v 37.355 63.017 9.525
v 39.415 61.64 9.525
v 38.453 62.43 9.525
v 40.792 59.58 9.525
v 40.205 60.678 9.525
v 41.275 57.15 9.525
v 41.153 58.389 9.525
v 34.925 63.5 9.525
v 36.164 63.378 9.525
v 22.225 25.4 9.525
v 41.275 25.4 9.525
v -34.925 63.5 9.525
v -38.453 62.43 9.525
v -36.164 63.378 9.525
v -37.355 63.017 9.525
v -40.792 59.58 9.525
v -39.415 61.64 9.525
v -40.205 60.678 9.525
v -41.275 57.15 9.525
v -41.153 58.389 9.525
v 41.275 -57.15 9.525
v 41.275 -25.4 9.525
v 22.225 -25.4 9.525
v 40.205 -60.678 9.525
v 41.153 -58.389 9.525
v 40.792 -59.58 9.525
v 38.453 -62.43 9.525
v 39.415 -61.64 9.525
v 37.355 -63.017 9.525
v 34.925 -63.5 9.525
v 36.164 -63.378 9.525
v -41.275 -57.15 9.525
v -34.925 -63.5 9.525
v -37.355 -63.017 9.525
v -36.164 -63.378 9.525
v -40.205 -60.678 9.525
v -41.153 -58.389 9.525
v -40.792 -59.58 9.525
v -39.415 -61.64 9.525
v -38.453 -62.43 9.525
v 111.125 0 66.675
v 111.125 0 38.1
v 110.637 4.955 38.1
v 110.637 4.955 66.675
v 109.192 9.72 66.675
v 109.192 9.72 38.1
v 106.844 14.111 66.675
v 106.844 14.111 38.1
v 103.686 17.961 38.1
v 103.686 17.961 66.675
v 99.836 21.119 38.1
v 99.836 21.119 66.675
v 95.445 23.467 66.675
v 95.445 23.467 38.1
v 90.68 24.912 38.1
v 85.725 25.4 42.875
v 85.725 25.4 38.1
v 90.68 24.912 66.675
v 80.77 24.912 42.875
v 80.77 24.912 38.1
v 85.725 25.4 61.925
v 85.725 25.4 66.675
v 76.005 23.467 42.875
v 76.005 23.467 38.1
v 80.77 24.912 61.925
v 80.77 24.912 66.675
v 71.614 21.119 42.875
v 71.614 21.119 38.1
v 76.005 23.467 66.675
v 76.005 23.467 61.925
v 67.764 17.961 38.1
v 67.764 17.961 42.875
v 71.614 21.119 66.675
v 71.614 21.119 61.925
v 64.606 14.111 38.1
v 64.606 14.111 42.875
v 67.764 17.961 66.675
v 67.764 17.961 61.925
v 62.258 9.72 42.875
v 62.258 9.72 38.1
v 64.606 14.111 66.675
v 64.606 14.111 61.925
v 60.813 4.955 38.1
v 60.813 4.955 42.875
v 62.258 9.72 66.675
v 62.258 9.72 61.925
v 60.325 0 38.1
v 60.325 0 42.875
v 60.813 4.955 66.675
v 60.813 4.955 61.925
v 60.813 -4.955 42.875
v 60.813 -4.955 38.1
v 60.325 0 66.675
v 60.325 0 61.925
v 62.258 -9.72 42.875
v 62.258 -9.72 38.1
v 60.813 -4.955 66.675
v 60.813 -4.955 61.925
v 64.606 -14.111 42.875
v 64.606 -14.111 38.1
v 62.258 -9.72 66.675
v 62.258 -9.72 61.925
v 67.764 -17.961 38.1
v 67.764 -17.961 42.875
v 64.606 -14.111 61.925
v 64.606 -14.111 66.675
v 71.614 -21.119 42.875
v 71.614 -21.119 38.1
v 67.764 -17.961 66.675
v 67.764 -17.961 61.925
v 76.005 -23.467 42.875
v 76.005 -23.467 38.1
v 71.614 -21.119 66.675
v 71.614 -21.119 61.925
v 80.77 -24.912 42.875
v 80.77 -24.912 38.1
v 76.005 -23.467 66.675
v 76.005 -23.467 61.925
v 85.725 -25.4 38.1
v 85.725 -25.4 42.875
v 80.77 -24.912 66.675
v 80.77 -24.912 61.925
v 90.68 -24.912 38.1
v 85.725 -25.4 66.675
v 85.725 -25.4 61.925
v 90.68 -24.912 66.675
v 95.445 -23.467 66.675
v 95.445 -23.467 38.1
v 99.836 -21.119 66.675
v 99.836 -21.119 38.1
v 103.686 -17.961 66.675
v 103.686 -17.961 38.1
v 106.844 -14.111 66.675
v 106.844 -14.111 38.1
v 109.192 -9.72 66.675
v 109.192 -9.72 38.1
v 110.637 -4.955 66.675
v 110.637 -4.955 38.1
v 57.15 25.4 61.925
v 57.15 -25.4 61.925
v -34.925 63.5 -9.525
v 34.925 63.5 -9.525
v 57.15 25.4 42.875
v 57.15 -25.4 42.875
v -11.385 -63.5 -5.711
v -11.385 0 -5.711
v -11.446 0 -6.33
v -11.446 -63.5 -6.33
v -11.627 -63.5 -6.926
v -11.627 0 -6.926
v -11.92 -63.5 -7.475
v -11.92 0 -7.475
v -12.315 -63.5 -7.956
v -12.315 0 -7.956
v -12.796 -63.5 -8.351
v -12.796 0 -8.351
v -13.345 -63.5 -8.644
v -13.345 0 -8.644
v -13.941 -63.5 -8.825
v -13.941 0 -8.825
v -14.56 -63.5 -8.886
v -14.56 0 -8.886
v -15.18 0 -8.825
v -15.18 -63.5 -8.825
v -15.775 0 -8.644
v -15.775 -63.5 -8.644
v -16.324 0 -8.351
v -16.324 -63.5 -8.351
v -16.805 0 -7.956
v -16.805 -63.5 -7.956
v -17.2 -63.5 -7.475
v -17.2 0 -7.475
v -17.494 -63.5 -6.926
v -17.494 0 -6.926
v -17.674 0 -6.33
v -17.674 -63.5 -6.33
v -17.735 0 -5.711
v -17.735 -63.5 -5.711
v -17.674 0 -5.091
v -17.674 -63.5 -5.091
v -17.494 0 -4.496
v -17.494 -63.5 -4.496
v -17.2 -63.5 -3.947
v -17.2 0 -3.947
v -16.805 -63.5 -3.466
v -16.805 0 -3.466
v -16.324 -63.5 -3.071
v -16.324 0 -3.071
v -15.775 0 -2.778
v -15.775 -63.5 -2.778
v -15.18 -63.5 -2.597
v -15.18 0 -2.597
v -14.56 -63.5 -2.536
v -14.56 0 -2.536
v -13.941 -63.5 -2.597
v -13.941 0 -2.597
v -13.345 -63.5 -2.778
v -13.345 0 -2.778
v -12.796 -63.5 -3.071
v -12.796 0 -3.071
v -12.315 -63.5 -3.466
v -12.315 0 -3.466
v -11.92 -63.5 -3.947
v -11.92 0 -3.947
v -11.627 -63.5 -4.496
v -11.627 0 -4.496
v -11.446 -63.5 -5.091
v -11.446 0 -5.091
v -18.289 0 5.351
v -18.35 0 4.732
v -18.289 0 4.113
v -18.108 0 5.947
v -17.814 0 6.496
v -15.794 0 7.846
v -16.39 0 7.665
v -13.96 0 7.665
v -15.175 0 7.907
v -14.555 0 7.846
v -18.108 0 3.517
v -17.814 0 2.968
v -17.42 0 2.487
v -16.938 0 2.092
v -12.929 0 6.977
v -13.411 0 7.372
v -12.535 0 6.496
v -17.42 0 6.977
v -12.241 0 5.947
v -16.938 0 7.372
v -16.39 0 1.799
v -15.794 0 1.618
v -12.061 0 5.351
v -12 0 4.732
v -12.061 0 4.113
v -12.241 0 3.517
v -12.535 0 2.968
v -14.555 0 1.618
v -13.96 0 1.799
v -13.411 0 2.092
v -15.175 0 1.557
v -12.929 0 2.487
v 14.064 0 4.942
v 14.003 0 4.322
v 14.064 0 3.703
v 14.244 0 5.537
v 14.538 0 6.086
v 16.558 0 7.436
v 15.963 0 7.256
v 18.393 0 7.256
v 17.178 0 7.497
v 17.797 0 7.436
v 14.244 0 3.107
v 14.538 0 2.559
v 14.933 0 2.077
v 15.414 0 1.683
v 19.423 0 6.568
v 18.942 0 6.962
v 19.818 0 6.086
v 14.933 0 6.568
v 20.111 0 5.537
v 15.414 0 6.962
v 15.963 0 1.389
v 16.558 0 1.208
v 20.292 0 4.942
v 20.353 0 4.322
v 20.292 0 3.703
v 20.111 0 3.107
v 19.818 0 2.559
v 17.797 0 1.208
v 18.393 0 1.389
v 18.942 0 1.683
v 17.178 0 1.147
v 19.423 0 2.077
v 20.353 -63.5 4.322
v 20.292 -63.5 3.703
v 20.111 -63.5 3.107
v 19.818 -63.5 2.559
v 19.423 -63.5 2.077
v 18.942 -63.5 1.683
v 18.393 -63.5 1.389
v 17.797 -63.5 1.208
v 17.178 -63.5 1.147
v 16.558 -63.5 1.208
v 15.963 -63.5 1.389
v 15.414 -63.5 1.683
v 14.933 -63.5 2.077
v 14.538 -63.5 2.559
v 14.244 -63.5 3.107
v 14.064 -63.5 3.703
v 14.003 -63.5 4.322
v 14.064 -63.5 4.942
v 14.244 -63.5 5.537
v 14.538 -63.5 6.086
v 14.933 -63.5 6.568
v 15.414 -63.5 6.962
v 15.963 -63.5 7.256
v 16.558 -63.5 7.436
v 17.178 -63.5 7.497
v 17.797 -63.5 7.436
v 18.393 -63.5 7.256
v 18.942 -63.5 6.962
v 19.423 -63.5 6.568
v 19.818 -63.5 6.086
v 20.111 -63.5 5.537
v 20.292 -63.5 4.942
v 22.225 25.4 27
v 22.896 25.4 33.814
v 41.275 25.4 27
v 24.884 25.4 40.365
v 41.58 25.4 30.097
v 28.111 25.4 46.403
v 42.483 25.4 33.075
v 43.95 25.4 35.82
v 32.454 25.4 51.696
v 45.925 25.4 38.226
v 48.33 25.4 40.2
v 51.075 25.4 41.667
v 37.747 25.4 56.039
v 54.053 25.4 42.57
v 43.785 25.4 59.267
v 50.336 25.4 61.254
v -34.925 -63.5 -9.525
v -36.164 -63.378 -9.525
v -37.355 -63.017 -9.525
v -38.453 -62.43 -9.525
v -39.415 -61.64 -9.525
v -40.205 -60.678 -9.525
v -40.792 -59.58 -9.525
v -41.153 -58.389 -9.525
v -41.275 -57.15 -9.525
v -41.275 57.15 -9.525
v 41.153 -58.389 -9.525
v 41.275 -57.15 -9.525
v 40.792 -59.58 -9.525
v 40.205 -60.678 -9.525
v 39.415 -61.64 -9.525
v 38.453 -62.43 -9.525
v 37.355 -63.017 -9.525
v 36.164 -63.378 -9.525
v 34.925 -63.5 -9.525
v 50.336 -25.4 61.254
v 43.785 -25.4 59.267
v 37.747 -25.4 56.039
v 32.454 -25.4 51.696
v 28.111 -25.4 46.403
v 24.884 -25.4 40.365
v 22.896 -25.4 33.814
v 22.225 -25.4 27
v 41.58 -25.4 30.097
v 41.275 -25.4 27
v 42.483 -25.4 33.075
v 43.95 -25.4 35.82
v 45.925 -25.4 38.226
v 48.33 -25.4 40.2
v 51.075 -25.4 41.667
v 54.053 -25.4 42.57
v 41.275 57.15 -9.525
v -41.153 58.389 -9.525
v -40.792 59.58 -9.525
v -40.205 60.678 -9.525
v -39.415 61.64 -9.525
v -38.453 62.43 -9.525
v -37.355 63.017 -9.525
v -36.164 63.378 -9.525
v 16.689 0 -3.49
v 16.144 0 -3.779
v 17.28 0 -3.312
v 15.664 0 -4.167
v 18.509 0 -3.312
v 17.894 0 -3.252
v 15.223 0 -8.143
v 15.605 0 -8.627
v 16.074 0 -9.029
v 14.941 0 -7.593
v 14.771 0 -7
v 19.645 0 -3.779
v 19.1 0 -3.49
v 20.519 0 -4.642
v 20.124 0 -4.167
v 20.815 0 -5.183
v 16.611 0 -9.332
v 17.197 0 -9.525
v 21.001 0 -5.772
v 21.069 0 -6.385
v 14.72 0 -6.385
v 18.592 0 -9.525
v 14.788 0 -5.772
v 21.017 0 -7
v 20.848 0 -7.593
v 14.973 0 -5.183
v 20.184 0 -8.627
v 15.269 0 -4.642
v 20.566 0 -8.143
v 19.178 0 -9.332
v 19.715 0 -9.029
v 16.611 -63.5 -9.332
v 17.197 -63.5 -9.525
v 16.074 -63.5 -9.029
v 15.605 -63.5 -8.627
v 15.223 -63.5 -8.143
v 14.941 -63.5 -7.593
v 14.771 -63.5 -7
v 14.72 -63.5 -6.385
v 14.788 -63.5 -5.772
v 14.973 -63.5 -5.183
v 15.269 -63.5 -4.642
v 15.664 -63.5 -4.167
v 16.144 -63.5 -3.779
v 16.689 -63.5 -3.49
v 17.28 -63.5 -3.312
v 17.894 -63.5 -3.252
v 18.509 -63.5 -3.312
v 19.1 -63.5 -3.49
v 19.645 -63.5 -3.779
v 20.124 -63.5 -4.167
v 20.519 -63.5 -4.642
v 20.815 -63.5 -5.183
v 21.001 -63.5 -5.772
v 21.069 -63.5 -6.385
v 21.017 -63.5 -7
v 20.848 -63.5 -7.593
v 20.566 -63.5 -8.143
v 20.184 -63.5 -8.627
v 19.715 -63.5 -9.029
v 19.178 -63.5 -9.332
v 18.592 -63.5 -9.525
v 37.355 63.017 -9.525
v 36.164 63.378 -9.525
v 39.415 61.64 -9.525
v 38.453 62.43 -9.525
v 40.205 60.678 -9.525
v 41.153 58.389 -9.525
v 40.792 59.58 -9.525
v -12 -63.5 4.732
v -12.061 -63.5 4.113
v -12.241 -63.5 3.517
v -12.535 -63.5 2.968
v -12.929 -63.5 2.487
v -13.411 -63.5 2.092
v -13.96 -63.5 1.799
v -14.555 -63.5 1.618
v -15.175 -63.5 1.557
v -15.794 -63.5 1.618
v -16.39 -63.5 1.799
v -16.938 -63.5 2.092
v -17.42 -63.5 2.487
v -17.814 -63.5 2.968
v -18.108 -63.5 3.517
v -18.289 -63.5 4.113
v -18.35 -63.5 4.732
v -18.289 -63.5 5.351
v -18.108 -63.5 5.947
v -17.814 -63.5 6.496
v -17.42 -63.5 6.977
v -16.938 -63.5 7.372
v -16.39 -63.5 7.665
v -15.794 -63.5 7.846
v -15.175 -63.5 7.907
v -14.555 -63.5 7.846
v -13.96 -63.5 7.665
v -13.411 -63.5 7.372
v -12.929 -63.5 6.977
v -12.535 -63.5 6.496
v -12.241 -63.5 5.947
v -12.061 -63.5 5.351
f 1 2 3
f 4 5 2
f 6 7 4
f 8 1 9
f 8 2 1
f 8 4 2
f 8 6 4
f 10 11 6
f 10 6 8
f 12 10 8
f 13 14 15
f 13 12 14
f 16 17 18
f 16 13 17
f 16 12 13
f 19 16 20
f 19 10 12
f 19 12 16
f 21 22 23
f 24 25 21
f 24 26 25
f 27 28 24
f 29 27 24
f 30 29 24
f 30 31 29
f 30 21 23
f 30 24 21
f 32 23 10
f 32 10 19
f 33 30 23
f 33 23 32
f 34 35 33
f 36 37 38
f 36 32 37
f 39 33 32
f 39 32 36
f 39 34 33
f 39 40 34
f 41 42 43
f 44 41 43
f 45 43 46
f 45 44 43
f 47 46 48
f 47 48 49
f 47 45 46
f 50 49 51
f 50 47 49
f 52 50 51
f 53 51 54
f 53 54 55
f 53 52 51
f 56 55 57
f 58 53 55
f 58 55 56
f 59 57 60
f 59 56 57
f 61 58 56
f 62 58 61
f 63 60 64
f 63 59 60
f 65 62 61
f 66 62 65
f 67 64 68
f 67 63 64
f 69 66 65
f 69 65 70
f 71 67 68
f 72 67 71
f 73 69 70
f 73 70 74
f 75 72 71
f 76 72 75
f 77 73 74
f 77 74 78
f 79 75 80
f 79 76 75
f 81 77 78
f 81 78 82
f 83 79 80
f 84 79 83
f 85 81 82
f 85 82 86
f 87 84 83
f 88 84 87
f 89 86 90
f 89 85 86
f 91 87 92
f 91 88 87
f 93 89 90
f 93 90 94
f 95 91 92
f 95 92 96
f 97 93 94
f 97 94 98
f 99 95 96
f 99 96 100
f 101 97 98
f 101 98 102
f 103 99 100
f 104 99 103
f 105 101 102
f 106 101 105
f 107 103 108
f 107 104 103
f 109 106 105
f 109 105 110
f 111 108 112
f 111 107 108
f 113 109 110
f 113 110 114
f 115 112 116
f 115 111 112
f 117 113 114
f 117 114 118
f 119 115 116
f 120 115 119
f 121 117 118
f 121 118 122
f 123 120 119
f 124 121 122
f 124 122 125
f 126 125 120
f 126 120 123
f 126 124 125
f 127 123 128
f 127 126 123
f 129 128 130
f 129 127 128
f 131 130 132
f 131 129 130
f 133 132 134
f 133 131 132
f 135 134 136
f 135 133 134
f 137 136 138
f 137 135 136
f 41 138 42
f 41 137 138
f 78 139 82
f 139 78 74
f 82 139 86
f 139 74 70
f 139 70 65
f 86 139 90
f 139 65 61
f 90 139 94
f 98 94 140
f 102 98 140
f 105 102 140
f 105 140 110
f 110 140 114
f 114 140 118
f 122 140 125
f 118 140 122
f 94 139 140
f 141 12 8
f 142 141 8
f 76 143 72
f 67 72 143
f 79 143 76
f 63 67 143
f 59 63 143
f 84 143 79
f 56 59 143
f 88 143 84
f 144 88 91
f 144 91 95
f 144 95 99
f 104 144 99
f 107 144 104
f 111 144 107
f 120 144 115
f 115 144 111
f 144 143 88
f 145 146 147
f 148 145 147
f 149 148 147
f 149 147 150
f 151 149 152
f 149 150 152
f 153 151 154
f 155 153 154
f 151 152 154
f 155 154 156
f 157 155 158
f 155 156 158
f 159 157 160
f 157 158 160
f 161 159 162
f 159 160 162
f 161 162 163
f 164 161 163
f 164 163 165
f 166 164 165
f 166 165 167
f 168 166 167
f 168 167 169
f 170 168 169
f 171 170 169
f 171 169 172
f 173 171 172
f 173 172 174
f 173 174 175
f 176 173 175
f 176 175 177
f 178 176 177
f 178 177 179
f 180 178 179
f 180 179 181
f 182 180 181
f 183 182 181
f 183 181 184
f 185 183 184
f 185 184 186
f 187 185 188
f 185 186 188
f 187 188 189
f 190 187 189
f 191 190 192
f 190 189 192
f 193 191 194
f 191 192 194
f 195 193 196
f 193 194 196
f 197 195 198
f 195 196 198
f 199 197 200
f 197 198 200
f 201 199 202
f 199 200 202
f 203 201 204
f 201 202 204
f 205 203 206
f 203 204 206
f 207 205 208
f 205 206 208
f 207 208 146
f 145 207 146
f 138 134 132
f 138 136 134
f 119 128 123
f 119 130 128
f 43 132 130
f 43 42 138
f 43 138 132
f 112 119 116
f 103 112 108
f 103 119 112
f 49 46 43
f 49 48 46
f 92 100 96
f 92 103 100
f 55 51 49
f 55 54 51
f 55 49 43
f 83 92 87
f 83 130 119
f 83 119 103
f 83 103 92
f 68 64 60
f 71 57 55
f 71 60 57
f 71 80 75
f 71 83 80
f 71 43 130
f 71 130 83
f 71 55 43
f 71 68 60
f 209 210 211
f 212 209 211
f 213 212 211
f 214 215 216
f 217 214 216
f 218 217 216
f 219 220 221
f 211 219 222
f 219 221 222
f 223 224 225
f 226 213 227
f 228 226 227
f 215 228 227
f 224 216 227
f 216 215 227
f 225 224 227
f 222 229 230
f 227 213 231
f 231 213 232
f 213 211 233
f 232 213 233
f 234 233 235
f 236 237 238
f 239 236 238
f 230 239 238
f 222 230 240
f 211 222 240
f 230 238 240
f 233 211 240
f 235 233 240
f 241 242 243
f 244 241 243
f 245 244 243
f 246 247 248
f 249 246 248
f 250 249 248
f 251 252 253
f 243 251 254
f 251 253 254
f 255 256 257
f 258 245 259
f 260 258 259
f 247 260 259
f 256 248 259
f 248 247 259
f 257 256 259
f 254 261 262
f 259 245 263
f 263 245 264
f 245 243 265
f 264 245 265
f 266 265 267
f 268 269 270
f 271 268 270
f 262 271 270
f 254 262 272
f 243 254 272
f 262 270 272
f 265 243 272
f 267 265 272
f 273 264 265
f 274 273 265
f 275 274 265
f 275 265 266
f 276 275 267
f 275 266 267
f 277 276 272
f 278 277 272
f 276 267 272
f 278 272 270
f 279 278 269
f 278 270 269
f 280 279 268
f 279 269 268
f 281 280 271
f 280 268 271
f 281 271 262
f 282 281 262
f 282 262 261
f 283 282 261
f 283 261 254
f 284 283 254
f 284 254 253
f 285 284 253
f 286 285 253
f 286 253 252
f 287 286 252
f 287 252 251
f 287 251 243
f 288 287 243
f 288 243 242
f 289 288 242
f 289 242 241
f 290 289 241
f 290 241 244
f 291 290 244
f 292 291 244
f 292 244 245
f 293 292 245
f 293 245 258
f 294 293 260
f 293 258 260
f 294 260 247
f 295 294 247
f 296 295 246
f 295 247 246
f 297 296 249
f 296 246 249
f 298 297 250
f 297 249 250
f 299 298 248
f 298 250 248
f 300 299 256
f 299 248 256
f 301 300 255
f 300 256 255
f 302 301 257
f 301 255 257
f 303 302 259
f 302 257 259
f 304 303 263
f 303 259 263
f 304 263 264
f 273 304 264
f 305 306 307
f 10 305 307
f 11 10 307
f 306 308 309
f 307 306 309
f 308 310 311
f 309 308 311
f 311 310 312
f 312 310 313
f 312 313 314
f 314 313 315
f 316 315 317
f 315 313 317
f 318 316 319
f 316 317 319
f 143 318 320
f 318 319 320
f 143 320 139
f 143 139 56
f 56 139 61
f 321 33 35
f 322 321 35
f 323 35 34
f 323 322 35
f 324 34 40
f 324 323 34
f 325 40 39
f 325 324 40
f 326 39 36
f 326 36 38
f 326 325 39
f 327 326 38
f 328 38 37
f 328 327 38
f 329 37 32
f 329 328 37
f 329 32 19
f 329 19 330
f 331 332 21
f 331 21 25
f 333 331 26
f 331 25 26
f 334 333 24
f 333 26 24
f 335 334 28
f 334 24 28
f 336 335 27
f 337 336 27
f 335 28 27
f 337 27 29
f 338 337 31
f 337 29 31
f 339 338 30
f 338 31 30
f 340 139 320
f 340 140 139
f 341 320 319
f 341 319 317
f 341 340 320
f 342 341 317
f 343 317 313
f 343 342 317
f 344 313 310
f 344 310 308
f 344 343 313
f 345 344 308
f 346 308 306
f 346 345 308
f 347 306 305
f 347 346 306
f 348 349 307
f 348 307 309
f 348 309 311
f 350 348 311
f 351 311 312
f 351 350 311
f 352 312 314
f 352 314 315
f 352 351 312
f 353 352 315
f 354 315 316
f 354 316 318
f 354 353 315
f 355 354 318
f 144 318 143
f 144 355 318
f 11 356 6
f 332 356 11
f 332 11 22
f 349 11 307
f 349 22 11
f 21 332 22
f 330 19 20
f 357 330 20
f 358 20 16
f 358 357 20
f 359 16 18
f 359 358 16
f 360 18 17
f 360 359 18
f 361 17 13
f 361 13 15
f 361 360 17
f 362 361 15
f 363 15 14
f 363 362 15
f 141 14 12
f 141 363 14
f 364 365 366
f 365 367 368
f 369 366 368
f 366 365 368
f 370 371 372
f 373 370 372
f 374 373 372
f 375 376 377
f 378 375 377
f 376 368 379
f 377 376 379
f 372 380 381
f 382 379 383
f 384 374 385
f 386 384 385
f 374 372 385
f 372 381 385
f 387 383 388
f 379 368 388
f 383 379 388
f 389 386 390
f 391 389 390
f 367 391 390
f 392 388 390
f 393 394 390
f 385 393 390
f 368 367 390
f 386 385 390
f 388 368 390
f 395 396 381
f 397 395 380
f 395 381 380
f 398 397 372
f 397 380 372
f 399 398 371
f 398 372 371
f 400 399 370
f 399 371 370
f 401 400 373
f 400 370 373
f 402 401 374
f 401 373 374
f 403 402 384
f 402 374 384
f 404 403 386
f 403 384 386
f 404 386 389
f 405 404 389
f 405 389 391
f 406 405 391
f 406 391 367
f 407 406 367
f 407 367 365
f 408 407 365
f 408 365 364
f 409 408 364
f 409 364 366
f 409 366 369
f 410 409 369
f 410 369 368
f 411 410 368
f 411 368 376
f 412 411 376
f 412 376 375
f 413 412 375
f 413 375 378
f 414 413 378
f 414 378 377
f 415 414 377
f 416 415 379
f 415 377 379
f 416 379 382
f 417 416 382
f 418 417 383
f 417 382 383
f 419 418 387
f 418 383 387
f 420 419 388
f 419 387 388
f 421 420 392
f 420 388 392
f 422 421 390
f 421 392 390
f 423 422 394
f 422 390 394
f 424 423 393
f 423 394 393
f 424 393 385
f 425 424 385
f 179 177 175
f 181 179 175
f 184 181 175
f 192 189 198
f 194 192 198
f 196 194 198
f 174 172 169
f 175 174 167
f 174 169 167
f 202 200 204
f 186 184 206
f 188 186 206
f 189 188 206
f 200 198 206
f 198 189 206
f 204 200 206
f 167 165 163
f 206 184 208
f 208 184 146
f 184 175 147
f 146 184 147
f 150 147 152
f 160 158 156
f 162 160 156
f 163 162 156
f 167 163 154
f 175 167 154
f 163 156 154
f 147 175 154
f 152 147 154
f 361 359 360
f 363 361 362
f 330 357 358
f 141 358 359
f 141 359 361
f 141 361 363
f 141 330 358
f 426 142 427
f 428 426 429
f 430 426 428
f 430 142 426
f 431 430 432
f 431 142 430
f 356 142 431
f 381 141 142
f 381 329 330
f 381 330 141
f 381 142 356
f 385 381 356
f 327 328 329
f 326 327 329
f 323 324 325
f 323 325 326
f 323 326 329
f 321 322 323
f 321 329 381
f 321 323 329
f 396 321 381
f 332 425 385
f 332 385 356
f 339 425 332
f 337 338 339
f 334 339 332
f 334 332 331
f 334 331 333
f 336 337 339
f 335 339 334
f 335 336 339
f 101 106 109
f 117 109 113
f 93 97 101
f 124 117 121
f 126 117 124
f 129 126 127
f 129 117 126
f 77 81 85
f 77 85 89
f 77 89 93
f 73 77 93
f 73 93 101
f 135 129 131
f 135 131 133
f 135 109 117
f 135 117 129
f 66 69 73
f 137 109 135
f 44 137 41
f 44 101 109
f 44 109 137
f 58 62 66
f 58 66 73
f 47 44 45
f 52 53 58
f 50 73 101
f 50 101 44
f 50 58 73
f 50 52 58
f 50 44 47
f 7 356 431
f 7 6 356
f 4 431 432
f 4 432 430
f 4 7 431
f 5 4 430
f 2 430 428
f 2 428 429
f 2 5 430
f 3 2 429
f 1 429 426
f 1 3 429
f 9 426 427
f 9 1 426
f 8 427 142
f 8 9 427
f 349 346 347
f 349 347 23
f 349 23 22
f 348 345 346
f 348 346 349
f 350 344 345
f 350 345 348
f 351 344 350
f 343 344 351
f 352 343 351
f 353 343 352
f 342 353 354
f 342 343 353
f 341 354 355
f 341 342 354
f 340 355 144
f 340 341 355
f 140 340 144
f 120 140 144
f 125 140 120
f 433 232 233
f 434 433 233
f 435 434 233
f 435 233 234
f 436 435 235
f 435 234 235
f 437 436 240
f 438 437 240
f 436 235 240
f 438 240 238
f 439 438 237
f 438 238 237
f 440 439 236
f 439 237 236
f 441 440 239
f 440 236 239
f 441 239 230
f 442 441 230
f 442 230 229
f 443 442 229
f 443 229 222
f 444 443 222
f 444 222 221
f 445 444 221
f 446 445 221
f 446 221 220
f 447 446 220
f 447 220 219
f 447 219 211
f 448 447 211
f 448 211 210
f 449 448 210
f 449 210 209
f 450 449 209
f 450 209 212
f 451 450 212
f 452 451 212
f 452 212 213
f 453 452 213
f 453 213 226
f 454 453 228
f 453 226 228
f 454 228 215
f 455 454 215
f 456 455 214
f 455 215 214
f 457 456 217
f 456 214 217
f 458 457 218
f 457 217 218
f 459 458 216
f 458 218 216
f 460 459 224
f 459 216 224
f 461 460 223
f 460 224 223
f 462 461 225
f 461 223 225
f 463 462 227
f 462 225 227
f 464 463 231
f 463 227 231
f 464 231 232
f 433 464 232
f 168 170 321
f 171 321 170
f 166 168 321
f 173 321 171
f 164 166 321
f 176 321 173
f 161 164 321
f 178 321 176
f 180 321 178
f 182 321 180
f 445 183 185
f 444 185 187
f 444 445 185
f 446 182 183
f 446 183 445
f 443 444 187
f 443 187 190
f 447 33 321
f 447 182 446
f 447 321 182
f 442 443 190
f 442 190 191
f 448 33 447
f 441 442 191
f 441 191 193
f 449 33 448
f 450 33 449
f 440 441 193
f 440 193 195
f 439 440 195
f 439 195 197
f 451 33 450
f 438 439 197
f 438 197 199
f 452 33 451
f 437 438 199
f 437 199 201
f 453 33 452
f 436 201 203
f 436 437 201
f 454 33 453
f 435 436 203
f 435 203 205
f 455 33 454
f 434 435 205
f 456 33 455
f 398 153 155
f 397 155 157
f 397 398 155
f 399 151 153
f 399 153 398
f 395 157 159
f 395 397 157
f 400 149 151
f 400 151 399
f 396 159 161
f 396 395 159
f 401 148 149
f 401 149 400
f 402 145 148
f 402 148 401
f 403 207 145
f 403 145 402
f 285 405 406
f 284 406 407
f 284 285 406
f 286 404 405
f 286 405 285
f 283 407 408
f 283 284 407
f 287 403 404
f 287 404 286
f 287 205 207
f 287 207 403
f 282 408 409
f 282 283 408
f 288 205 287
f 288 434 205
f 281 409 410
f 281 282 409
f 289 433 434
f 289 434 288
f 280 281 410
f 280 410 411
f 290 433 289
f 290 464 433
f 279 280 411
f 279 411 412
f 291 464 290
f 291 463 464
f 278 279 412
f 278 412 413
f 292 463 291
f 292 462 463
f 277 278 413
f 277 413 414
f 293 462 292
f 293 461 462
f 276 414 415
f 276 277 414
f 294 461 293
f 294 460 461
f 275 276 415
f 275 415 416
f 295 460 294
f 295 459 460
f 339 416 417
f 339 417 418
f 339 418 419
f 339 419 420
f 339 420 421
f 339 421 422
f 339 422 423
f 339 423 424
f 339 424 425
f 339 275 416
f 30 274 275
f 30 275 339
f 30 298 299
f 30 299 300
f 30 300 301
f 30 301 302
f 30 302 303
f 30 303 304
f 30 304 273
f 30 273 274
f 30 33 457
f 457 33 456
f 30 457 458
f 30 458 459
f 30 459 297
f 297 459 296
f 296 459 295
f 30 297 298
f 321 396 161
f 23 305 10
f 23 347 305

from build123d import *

# Parameters (mm, degrees)
F1_DEPTH = 63.5
F2_DEPTH = 25.4
F0_W     = 25.4
F0_H     = 19.05
F3_DEPTH = 25.4
F5_R     = 6.35
F7_D     = 6.35
F7_DEPTH = 63.501


with BuildPart() as f1:
    # F0 (on Front) → F1 (new body, symmetric)
    with BuildSketch(Plane.XZ):
        Polygon((41.275, -9.525), (41.275, 9.525), (22.225, 9.525), (-41.275, 9.525), (-41.275, -9.525), align=None)
    extrude(amount=F1_DEPTH, both=True)

    # F0 (on Front) → F2 (join, symmetric)
    with BuildSketch(Plane.XZ):
        with BuildLine():
            Line((22.225, 9.525), (41.275, 9.525))
            Line((41.275, 9.525), (41.275, 27.0002))
            ThreePointArc((41.275, 27.0002), (45.9246798487, 38.2255201513), (57.15, 42.8752))
            Line((57.15, 42.8752), (60.325, 42.8752))
            Line((60.325, 42.8752), (60.325, 61.9252))
            Line((60.325, 61.9252), (57.15, 61.9252))
            ThreePointArc((57.15, 61.9252), (32.4542956671, 51.6959043329), (22.225, 27.0002))
            Line((22.225, 27.0002), (22.225, 9.525))
        make_face()
    extrude(amount=F2_DEPTH, both=True)

    # F0 (on Front) → F3 (join, symmetric)
    with BuildSketch(Plane.XZ):
        with Locations((73.025, 52.4002)):
            Rectangle(F0_W, F0_H)
    extrude(amount=F3_DEPTH, both=True)

    # F0 (on Front) → F4 (revolve)
    with BuildSketch(Plane.XZ):
        Polygon((85.725, 61.9252), (85.725, 42.8752), (85.725, 38.1), (111.125, 38.1), (111.125, 66.675), (85.725, 66.675), align=None)
    revolve(axis=Axis((85.725, 0, 52.3875), (0, 0, 1)))

    # F5
    f5_edges = [f1.edges().sort_by_distance(p)[0] for p in [
        (-41.275, -63.5, 0),
        (41.275, -63.5, 0),
        (41.275, 63.5, 0),
        (-41.275, 63.5, 0),
    ]]
    fillet(f5_edges, radius=F5_R)

    # F7 (through all, one way)
    with BuildSketch(Plane(origin=(0, 0, 0), x_dir=(1, 0, 0), z_dir=(0, 1, 0))):
        with Locations((17.1776954085, -4.3224697001), (-15.1745518669, -4.7319913283), (-14.5602682605, 5.7108225301), (17.8943593055, 6.4274864271)):
            Circle(F7_D / 2)
    extrude(amount=-F7_DEPTH, mode=Mode.SUBTRACT)


solid = f1.part
